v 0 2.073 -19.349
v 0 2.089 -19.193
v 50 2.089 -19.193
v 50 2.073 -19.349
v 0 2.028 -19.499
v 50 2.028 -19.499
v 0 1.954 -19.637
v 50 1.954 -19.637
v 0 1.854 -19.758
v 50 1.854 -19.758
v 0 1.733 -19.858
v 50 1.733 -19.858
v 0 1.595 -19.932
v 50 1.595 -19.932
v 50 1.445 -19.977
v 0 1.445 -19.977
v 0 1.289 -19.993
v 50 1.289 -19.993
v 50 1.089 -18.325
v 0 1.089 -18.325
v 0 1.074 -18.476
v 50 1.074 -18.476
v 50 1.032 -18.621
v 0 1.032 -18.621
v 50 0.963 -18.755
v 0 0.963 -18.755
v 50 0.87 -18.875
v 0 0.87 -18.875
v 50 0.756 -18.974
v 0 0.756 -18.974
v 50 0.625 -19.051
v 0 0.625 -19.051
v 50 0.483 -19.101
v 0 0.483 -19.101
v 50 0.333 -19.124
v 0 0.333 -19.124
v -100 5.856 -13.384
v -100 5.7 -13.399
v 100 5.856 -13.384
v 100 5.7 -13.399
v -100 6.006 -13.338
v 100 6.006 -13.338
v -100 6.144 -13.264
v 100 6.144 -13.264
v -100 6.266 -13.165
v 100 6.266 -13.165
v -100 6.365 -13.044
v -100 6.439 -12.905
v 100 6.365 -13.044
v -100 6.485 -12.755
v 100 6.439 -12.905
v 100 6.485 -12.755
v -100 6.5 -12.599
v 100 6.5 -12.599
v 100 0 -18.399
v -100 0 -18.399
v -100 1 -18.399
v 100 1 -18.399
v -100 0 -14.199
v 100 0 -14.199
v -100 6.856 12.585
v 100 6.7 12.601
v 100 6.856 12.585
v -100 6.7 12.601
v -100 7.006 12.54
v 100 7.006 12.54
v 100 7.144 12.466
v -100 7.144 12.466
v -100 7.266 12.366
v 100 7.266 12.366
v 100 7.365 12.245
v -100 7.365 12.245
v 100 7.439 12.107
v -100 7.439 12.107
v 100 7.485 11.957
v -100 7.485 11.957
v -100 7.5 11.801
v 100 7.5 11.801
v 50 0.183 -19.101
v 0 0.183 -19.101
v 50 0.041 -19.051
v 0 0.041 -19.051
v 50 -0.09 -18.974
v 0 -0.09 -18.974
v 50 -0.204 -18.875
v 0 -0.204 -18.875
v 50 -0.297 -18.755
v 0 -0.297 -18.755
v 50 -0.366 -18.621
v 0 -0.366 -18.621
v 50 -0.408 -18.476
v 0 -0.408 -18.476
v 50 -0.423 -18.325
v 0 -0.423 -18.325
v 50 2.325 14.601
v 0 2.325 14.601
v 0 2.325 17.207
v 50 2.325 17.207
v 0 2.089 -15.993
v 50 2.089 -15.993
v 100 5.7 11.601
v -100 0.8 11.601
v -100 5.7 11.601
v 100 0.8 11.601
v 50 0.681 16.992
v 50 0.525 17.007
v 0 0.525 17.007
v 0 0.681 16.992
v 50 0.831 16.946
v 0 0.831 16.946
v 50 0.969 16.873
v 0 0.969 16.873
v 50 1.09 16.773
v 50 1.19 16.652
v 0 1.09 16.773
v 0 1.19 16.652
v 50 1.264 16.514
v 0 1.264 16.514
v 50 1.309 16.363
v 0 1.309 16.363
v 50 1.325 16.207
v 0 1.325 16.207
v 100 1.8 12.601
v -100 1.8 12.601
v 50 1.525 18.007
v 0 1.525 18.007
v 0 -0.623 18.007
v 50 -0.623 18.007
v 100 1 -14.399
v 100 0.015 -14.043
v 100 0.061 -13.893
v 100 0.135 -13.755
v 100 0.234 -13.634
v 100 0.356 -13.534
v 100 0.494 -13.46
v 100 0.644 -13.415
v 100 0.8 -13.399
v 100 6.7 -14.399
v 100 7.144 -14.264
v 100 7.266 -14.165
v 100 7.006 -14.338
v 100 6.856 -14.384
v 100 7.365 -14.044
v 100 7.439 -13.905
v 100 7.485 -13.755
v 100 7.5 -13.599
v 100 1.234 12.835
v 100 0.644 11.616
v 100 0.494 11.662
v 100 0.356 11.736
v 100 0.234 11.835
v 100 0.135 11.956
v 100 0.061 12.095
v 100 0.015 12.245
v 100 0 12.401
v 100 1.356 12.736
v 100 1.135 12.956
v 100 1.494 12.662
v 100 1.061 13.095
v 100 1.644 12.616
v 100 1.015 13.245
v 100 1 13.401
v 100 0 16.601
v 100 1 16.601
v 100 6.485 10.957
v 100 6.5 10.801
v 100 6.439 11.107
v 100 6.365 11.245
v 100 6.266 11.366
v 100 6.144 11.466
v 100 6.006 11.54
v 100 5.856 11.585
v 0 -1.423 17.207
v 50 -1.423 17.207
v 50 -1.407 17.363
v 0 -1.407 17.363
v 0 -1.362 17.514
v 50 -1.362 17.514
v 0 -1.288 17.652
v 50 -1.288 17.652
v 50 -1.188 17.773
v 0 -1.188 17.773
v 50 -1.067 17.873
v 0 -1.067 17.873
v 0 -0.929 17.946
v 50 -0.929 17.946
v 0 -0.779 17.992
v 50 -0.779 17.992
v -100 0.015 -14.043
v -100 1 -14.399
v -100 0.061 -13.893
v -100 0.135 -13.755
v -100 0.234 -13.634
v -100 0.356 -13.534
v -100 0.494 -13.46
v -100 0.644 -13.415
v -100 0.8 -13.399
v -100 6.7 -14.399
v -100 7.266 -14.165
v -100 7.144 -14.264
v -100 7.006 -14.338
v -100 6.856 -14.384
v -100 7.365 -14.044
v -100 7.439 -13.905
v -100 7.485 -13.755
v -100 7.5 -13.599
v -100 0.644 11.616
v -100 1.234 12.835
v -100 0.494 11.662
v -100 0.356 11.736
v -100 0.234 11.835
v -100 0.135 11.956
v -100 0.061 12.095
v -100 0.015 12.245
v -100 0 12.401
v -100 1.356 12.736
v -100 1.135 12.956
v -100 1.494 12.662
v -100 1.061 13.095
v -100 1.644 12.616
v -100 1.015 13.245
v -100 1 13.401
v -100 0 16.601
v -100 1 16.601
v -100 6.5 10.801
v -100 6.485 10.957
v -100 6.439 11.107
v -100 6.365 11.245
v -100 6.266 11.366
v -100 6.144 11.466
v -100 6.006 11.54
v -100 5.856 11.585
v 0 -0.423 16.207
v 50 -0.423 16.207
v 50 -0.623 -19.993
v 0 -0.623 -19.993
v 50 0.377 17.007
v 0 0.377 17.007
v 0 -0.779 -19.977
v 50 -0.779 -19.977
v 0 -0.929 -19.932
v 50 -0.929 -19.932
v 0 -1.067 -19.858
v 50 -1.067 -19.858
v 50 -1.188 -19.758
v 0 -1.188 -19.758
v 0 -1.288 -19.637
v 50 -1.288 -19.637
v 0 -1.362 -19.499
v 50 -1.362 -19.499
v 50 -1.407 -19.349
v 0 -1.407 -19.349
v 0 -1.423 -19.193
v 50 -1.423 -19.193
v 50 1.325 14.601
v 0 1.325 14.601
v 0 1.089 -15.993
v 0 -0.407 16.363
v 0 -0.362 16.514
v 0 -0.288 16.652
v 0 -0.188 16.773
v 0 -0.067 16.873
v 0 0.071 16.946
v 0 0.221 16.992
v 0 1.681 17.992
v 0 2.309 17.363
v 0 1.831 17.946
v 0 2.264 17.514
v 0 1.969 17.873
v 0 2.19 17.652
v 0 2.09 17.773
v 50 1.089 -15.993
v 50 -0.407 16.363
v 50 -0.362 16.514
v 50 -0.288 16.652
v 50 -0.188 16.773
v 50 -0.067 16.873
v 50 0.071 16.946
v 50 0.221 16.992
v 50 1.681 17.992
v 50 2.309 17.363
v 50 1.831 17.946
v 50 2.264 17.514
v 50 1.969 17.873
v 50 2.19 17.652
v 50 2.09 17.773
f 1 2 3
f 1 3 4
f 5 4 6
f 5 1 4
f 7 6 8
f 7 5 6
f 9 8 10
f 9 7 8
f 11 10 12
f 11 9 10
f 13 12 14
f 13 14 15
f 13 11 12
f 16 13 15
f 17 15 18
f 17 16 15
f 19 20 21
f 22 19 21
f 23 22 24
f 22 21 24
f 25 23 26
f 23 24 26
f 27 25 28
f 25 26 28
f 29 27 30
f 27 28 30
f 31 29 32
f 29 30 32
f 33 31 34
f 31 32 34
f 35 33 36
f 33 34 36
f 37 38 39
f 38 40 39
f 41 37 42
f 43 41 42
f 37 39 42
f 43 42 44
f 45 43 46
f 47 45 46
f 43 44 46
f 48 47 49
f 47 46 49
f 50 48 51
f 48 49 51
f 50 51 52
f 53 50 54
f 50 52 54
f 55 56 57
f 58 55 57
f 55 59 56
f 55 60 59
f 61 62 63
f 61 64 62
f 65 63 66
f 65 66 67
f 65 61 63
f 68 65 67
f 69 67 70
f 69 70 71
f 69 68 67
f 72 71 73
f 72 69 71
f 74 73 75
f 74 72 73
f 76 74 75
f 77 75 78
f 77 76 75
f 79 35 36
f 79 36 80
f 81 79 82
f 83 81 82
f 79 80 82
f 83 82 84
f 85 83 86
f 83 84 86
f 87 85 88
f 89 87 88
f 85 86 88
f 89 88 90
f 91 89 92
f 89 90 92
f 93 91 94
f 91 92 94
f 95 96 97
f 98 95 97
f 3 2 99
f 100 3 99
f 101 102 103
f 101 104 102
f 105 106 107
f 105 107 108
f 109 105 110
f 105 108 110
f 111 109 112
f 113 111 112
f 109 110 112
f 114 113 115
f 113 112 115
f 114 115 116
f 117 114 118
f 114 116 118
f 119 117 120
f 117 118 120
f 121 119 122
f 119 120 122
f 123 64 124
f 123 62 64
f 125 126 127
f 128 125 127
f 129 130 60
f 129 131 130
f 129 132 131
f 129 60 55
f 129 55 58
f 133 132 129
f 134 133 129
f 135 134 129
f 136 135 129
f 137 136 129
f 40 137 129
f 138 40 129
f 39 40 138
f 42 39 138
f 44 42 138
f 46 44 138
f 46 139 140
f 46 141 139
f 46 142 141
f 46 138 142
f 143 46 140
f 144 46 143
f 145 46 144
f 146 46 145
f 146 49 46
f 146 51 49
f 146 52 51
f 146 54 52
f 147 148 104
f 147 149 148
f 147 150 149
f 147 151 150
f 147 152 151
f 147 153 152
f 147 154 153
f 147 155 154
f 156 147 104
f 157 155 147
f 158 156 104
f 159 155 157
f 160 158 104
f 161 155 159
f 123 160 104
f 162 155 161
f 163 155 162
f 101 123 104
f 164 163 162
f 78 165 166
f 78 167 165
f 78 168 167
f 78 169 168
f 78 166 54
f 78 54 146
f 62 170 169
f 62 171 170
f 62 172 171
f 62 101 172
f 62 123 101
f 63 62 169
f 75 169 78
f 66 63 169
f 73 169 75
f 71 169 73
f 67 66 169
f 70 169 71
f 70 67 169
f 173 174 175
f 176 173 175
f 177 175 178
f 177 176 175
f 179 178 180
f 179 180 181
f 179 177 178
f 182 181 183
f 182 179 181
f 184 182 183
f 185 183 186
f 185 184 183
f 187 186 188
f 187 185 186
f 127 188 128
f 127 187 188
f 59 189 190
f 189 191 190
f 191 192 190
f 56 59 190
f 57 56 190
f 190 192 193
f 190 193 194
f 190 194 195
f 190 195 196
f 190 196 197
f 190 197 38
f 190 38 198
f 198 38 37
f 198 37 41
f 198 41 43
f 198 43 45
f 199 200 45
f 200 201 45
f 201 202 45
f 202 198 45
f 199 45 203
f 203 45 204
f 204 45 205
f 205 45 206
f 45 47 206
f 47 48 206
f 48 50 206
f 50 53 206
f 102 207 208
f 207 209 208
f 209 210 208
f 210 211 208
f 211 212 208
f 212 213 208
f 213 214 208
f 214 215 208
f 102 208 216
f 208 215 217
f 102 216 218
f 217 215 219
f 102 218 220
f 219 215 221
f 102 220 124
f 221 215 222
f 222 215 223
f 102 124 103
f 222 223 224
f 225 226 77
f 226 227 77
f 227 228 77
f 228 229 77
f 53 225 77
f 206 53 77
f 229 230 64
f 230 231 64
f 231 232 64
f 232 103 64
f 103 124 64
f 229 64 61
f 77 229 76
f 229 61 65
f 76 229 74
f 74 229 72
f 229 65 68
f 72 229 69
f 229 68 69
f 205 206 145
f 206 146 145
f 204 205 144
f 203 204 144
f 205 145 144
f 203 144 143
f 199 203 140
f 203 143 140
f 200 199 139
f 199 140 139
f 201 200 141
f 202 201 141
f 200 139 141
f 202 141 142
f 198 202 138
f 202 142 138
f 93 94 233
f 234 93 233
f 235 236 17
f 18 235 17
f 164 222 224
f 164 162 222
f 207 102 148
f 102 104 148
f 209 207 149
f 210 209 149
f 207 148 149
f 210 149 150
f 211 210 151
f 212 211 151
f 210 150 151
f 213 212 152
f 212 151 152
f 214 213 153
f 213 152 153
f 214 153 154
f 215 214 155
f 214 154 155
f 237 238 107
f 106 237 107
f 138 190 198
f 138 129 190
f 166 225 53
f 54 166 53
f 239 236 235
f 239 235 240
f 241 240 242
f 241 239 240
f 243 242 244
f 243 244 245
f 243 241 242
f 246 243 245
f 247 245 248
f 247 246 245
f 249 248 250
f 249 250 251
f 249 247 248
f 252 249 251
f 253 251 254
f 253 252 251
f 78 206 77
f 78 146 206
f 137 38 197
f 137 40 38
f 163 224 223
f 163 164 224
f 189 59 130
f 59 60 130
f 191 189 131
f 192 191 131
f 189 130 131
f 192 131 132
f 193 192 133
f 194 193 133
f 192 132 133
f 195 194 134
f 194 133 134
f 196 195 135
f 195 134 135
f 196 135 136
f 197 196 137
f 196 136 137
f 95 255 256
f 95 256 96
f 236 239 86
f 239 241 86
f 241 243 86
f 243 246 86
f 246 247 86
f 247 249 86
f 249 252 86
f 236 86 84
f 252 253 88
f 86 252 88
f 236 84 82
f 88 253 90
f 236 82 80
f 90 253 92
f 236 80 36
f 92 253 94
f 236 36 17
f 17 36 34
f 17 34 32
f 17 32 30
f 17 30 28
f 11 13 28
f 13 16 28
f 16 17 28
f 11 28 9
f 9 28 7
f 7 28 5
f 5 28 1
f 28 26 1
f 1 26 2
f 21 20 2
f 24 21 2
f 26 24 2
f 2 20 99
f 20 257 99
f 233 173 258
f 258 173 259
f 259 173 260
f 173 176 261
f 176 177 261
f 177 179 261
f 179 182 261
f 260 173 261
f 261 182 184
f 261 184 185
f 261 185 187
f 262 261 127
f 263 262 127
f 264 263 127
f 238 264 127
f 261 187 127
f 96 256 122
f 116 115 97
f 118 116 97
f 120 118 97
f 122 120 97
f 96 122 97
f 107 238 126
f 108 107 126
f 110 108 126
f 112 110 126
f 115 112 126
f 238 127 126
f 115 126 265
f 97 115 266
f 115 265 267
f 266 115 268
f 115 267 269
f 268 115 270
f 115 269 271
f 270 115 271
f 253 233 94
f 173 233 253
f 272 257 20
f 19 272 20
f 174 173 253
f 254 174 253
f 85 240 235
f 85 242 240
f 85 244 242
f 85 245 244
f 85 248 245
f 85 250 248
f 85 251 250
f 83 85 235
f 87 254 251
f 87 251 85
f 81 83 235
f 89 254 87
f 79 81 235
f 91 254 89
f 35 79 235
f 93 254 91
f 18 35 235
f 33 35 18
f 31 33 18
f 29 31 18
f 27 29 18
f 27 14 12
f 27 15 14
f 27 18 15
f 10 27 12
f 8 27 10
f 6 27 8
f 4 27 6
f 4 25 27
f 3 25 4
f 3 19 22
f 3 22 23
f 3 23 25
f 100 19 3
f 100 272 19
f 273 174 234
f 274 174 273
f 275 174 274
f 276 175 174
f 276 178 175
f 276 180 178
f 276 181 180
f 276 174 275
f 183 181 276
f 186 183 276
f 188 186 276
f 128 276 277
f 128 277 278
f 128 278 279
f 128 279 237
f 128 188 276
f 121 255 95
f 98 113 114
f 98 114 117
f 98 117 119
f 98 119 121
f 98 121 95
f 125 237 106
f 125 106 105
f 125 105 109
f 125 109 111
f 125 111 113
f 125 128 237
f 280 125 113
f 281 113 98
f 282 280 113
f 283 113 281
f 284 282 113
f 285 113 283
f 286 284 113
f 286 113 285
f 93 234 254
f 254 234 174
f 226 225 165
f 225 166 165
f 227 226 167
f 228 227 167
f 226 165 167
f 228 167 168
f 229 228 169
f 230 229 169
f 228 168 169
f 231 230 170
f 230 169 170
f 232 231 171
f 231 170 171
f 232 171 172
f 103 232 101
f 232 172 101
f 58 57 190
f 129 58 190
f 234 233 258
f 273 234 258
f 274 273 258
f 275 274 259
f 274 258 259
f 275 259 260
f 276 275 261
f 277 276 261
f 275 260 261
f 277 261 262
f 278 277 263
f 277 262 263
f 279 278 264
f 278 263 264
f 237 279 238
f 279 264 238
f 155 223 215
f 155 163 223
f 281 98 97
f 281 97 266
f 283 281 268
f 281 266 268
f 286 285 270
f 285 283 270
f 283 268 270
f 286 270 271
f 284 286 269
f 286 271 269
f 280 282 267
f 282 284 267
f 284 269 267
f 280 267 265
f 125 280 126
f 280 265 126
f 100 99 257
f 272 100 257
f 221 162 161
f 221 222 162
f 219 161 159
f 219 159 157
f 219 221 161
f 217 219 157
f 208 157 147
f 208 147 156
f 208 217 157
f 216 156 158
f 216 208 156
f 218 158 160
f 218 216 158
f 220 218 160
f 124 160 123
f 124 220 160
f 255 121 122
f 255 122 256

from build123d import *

# Parameters (mm, degrees)
F1_DEPTH    = 100
F2_R        = 0.8
F3_DEPTH    = 50
F4_T1_DEPTH = 50
F4_T3_DEPTH = 54


# Not quite as in the source:
# - a fillet or chamfer that OpenCascade refuses, or shapes differently, is made with other operations: its cross-section is extruded or revolved along the edge and cut away or added


with BuildPart() as f1:
    # F0 (on Right) → F1 (new body, symmetric)
    with BuildSketch(Plane.YZ):
        Polygon((1, 16.6007670015), (0, 16.6007670015), (0, 11.6007670015), (6.5, 11.6007670015), (6.5, -13.3992329985), (0, -13.3992329985), (0, -18.3992329985), (1, -18.3992329985), (1, -14.3992329985), (7.5, -14.3992329985), (7.5, 12.6007670015), (1, 12.6007670015), align=None)
    extrude(amount=F1_DEPTH, both=True)

    # F2
    f2_edges = [f1.edges().sort_by_distance(p)[0] for p in [
        (0, 1, 12.600767),
        (0, 0, 11.600767),
        (0, 7.5, 12.600767),
        (0, 6.5, 11.600767),
        (0, 7.5, -14.399233),
        (0, 0, -13.399233),
        (0, 6.5, -13.399233),
    ]]
    fillet(f2_edges, radius=F2_R)


with BuildPart() as f3:
    # F0 (on Right) → F3 (new body)
    with BuildSketch(Plane.YZ):
        Polygon((1.3245146256, 17.0073675215), (1.3245146256, 14.6007670015), (2.3245146256, 14.6007670015), (2.3245146256, 18.0073675215), (-1.4227514728, 18.0073675215), (-1.4227514728, -19.9926324785), (2.0886021191, -19.9926324785), (2.0886021191, -15.9926324785), (1.0886021191, -15.9926324785), (1.0886021191, -19.1249549389), (-0.4227514728, -19.1249549389), (-0.4227514728, 17.0073675215), align=None)
    extrude(amount=F3_DEPTH)

    # F4: fillet of radius 0.8 on 8 edges, made by hand

    # F4_s2 → F4_t1 (join)
    with BuildSketch(Plane.YZ):
        with BuildLine():
            ThreePointArc((-0.4227514728, 16.2073675215), (-0.1884368977, 16.7730529465), (0.3772485272, 17.0073675215))
            Line((0.3772485272, 17.0073675215), (-0.4227514728, 17.0073675215))
            Line((-0.4227514728, 17.0073675215), (-0.4227514728, 16.2073675215))
        make_face()
        with BuildLine():
            ThreePointArc((0.5245146256, 17.0073675215), (1.0902000505, 16.7730529465), (1.3245146256, 16.2073675215))
            Line((1.3245146256, 16.2073675215), (1.3245146256, 17.0073675215))
            Line((1.3245146256, 17.0073675215), (0.5245146256, 17.0073675215))
        make_face()
        with BuildLine():
            ThreePointArc((0.3772485272, -19.1249549389), (-0.1884368977, -18.8906403638), (-0.4227514728, -18.3249549389))
            Line((-0.4227514728, -18.3249549389), (-0.4227514728, -19.1249549389))
            Line((-0.4227514728, -19.1249549389), (0.3772485272, -19.1249549389))
        make_face()
        with BuildLine():
            ThreePointArc((1.0886021191, -18.3249549389), (0.8542875441, -18.8906403638), (0.2886021191, -19.1249549389))
            Line((0.2886021191, -19.1249549389), (1.0886021191, -19.1249549389))
            Line((1.0886021191, -19.1249549389), (1.0886021191, -18.3249549389))
        make_face()
    extrude(amount=F4_T1_DEPTH)

    # F4_s4 → F4_t3 (cut)
    with BuildSketch(Plane.YZ.offset(-2)):
        with BuildLine():
            ThreePointArc((-1.4227514728, 17.2073675215), (-1.1884368977, 17.7730529465), (-0.6227514728, 18.0073675215))
            Line((-0.6227514728, 18.0073675215), (-1.4227514728, 18.0073675215))
            Line((-1.4227514728, 18.0073675215), (-1.4227514728, 17.2073675215))
        make_face()
        with BuildLine():
            ThreePointArc((2.3245146256, 17.2073675215), (2.0902000505, 17.7730529465), (1.5245146256, 18.0073675215))
            Line((1.5245146256, 18.0073675215), (2.3245146256, 18.0073675215))
            Line((2.3245146256, 18.0073675215), (2.3245146256, 17.2073675215))
        make_face()
        with BuildLine():
            ThreePointArc((-0.6227514728, -19.9926324785), (-1.1884368977, -19.7583179034), (-1.4227514728, -19.1926324785))
            Line((-1.4227514728, -19.1926324785), (-1.4227514728, -19.9926324785))
            Line((-1.4227514728, -19.9926324785), (-0.6227514728, -19.9926324785))
        make_face()
        with BuildLine():
            ThreePointArc((2.0886021191, -19.1926324785), (1.8542875441, -19.7583179034), (1.2886021191, -19.9926324785))
            Line((1.2886021191, -19.9926324785), (2.0886021191, -19.9926324785))
            Line((2.0886021191, -19.9926324785), (2.0886021191, -19.1926324785))
        make_face()
    extrude(amount=F4_T3_DEPTH, mode=Mode.SUBTRACT)


solid = Compound([f1.part, f3.part])
